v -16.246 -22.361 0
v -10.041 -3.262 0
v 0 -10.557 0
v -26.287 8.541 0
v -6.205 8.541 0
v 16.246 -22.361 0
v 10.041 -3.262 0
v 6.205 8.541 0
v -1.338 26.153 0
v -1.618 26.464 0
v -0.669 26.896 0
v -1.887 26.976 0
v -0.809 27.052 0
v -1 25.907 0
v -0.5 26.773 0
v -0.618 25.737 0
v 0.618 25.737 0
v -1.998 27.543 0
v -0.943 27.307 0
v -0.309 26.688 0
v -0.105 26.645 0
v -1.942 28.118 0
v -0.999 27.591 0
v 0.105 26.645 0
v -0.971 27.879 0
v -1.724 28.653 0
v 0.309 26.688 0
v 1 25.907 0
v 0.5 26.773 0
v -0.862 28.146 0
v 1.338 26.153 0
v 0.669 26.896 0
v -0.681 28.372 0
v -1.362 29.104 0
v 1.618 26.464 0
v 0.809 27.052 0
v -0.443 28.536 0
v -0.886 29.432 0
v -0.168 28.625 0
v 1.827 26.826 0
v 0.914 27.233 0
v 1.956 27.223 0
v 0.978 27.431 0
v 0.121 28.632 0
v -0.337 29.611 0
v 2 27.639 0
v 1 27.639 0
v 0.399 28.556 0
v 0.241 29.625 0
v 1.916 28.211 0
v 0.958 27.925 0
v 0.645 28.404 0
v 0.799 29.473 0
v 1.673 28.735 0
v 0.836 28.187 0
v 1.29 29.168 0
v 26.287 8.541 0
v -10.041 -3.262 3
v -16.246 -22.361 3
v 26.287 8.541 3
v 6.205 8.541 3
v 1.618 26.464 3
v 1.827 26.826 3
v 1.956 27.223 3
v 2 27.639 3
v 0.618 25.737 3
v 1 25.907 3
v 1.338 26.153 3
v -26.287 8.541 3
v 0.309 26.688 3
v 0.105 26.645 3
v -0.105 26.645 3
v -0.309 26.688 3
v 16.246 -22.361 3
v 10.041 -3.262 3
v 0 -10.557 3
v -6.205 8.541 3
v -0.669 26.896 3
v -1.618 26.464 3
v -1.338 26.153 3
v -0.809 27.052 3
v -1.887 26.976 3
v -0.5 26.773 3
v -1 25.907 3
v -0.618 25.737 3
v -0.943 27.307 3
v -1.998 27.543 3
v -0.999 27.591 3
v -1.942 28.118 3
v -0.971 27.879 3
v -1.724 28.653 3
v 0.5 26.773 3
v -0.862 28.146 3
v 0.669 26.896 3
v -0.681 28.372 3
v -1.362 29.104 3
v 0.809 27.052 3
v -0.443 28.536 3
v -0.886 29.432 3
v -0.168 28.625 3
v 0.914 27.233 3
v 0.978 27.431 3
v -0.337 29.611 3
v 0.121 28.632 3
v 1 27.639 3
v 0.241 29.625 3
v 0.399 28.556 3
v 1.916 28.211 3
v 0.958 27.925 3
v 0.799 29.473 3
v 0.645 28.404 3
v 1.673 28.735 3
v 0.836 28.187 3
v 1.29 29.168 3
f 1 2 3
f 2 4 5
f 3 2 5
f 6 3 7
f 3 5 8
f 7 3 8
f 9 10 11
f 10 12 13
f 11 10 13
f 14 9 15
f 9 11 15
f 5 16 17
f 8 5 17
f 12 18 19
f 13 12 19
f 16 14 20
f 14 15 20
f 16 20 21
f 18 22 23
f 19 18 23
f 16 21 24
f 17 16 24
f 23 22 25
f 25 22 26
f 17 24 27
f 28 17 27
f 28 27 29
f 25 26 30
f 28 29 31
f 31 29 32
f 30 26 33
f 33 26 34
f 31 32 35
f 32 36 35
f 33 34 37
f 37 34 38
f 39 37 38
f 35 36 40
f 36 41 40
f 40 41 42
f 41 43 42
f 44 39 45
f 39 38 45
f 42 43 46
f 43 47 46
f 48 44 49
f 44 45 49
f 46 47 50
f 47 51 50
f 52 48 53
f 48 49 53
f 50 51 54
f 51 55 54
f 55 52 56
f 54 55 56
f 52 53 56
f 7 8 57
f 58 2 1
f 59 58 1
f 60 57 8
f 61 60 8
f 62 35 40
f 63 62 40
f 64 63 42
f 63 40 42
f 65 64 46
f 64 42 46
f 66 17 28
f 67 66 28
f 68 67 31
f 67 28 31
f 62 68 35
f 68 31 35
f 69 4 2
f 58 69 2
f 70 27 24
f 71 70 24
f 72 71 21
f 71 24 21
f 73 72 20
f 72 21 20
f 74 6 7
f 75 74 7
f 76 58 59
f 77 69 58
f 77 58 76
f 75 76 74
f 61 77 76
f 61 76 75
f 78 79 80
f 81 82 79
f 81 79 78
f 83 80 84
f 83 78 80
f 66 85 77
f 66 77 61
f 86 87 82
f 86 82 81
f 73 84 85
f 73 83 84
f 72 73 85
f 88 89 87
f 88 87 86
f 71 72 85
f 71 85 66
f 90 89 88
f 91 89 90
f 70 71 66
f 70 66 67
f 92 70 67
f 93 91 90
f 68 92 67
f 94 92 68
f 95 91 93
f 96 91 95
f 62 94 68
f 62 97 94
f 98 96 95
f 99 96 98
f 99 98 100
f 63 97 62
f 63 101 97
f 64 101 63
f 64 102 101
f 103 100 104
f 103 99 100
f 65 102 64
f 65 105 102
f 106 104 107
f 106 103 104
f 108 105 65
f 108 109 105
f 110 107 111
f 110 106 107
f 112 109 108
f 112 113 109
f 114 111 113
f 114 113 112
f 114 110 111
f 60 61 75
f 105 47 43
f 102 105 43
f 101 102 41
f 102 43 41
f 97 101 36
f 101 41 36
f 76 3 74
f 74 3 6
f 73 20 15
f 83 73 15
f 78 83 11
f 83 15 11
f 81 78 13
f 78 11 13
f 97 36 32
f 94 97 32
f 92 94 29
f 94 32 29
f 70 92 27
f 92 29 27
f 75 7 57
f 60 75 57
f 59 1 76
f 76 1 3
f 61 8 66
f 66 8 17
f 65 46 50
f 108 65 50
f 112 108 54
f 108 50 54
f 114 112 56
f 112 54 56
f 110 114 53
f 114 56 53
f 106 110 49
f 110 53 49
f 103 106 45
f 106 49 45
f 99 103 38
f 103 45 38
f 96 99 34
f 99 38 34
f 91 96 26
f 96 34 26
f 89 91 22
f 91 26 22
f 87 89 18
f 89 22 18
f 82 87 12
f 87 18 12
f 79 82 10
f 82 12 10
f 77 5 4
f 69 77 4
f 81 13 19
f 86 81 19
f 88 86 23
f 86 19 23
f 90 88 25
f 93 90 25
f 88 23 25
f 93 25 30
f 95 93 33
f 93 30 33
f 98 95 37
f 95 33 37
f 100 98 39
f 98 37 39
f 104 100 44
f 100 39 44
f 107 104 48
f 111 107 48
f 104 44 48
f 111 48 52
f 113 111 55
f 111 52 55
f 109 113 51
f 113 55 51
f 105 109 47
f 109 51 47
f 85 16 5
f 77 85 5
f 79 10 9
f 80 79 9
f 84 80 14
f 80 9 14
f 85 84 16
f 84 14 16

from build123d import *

# Parameters (mm, degrees)
F1_DEPTH = 3


# Not quite as in the source:
# - a feature names something its author has since deleted; it is built from what else it names


with BuildPart() as f1:
    # F0 (on Top) → F1 (new body)
    with BuildSketch(Plane.XY):
        with BuildLine():
            ThreePointArc((0.6180339887, 25.7372071924), (0, 25.639320225), (-0.6180339887, 25.7372071924))
            Line((-0.6180339887, 25.7372071924), (-6.2054140173, 8.5410196625))
            Line((-6.2054140173, 8.5410196625), (-26.286555606, 8.5410196625))
            Line((-26.286555606, 8.5410196625), (-10.0405707943, -3.2623792125))
            Line((-10.0405707943, -3.2623792125), (-16.2459848116, -22.360679775))
            Line((-16.2459848116, -22.360679775), (0, -10.5572809))
            Line((0, -10.5572809), (16.2459848116, -22.360679775))
            Line((16.2459848116, -22.360679775), (10.0405707943, -3.2623792125))
            Line((10.0405707943, -3.2623792125), (26.286555606, 8.5410196625))
            Line((26.286555606, 8.5410196625), (6.2054140173, 8.5410196625))
            Line((6.2054140173, 8.5410196625), (0.6180339887, 25.7372071924))
        make_face()
        with BuildLine():
            ThreePointArc((0.3090169944, 26.6882637087), (0, 26.639320225), (-0.3090169944, 26.6882637087))
            Line((-0.3090169944, 26.6882637087), (-0.6180339887, 25.7372071924))
            ThreePointArc((-0.6180339887, 25.7372071924), (0, 25.639320225), (0.6180339887, 25.7372071924))
            Line((0.6180339887, 25.7372071924), (0.3090169944, 26.6882637087))
        make_face()
        with BuildLine():
            Line((1.6180339887, 26.4637497204), (0.8090169944, 27.0515349727))
            ThreePointArc((0.8090169944, 27.0515349727), (0.5877852523, 26.8303032306), (0.3090169944, 26.6882637087))
            Line((0.3090169944, 26.6882637087), (0.6180339887, 25.7372071924))
            ThreePointArc((0.6180339887, 25.7372071924), (1.1755705046, 26.0212862363), (1.6180339887, 26.4637497204))
        make_face()
        with BuildLine():
            ThreePointArc((1, 27.639320225), (0.9510565163, 27.3303032306), (0.8090169944, 27.0515349727))
            Line((0.8090169944, 27.0515349727), (1.6180339887, 26.4637497204))
            ThreePointArc((1.6180339887, 26.4637497204), (1.9021130326, 27.0212862363), (2, 27.639320225))
            ThreePointArc((2, 27.639320225), (-0.6180339887, 29.5414332576), (-1.6180339887, 26.4637497204))
            Line((-1.6180339887, 26.4637497204), (-0.8090169944, 27.0515349727))
            ThreePointArc((-0.8090169944, 27.0515349727), (-0.3090169944, 28.5903767413), (1, 27.639320225))
        make_face()
        with BuildLine():
            ThreePointArc((-0.3090169944, 26.6882637087), (-0.5877852523, 26.8303032306), (-0.8090169944, 27.0515349727))
            Line((-0.8090169944, 27.0515349727), (-1.6180339887, 26.4637497204))
            ThreePointArc((-1.6180339887, 26.4637497204), (-1.1755705046, 26.0212862363), (-0.6180339887, 25.7372071924))
            Line((-0.6180339887, 25.7372071924), (-0.3090169944, 26.6882637087))
        make_face()
    extrude(amount=F1_DEPTH)


solid = f1.part
